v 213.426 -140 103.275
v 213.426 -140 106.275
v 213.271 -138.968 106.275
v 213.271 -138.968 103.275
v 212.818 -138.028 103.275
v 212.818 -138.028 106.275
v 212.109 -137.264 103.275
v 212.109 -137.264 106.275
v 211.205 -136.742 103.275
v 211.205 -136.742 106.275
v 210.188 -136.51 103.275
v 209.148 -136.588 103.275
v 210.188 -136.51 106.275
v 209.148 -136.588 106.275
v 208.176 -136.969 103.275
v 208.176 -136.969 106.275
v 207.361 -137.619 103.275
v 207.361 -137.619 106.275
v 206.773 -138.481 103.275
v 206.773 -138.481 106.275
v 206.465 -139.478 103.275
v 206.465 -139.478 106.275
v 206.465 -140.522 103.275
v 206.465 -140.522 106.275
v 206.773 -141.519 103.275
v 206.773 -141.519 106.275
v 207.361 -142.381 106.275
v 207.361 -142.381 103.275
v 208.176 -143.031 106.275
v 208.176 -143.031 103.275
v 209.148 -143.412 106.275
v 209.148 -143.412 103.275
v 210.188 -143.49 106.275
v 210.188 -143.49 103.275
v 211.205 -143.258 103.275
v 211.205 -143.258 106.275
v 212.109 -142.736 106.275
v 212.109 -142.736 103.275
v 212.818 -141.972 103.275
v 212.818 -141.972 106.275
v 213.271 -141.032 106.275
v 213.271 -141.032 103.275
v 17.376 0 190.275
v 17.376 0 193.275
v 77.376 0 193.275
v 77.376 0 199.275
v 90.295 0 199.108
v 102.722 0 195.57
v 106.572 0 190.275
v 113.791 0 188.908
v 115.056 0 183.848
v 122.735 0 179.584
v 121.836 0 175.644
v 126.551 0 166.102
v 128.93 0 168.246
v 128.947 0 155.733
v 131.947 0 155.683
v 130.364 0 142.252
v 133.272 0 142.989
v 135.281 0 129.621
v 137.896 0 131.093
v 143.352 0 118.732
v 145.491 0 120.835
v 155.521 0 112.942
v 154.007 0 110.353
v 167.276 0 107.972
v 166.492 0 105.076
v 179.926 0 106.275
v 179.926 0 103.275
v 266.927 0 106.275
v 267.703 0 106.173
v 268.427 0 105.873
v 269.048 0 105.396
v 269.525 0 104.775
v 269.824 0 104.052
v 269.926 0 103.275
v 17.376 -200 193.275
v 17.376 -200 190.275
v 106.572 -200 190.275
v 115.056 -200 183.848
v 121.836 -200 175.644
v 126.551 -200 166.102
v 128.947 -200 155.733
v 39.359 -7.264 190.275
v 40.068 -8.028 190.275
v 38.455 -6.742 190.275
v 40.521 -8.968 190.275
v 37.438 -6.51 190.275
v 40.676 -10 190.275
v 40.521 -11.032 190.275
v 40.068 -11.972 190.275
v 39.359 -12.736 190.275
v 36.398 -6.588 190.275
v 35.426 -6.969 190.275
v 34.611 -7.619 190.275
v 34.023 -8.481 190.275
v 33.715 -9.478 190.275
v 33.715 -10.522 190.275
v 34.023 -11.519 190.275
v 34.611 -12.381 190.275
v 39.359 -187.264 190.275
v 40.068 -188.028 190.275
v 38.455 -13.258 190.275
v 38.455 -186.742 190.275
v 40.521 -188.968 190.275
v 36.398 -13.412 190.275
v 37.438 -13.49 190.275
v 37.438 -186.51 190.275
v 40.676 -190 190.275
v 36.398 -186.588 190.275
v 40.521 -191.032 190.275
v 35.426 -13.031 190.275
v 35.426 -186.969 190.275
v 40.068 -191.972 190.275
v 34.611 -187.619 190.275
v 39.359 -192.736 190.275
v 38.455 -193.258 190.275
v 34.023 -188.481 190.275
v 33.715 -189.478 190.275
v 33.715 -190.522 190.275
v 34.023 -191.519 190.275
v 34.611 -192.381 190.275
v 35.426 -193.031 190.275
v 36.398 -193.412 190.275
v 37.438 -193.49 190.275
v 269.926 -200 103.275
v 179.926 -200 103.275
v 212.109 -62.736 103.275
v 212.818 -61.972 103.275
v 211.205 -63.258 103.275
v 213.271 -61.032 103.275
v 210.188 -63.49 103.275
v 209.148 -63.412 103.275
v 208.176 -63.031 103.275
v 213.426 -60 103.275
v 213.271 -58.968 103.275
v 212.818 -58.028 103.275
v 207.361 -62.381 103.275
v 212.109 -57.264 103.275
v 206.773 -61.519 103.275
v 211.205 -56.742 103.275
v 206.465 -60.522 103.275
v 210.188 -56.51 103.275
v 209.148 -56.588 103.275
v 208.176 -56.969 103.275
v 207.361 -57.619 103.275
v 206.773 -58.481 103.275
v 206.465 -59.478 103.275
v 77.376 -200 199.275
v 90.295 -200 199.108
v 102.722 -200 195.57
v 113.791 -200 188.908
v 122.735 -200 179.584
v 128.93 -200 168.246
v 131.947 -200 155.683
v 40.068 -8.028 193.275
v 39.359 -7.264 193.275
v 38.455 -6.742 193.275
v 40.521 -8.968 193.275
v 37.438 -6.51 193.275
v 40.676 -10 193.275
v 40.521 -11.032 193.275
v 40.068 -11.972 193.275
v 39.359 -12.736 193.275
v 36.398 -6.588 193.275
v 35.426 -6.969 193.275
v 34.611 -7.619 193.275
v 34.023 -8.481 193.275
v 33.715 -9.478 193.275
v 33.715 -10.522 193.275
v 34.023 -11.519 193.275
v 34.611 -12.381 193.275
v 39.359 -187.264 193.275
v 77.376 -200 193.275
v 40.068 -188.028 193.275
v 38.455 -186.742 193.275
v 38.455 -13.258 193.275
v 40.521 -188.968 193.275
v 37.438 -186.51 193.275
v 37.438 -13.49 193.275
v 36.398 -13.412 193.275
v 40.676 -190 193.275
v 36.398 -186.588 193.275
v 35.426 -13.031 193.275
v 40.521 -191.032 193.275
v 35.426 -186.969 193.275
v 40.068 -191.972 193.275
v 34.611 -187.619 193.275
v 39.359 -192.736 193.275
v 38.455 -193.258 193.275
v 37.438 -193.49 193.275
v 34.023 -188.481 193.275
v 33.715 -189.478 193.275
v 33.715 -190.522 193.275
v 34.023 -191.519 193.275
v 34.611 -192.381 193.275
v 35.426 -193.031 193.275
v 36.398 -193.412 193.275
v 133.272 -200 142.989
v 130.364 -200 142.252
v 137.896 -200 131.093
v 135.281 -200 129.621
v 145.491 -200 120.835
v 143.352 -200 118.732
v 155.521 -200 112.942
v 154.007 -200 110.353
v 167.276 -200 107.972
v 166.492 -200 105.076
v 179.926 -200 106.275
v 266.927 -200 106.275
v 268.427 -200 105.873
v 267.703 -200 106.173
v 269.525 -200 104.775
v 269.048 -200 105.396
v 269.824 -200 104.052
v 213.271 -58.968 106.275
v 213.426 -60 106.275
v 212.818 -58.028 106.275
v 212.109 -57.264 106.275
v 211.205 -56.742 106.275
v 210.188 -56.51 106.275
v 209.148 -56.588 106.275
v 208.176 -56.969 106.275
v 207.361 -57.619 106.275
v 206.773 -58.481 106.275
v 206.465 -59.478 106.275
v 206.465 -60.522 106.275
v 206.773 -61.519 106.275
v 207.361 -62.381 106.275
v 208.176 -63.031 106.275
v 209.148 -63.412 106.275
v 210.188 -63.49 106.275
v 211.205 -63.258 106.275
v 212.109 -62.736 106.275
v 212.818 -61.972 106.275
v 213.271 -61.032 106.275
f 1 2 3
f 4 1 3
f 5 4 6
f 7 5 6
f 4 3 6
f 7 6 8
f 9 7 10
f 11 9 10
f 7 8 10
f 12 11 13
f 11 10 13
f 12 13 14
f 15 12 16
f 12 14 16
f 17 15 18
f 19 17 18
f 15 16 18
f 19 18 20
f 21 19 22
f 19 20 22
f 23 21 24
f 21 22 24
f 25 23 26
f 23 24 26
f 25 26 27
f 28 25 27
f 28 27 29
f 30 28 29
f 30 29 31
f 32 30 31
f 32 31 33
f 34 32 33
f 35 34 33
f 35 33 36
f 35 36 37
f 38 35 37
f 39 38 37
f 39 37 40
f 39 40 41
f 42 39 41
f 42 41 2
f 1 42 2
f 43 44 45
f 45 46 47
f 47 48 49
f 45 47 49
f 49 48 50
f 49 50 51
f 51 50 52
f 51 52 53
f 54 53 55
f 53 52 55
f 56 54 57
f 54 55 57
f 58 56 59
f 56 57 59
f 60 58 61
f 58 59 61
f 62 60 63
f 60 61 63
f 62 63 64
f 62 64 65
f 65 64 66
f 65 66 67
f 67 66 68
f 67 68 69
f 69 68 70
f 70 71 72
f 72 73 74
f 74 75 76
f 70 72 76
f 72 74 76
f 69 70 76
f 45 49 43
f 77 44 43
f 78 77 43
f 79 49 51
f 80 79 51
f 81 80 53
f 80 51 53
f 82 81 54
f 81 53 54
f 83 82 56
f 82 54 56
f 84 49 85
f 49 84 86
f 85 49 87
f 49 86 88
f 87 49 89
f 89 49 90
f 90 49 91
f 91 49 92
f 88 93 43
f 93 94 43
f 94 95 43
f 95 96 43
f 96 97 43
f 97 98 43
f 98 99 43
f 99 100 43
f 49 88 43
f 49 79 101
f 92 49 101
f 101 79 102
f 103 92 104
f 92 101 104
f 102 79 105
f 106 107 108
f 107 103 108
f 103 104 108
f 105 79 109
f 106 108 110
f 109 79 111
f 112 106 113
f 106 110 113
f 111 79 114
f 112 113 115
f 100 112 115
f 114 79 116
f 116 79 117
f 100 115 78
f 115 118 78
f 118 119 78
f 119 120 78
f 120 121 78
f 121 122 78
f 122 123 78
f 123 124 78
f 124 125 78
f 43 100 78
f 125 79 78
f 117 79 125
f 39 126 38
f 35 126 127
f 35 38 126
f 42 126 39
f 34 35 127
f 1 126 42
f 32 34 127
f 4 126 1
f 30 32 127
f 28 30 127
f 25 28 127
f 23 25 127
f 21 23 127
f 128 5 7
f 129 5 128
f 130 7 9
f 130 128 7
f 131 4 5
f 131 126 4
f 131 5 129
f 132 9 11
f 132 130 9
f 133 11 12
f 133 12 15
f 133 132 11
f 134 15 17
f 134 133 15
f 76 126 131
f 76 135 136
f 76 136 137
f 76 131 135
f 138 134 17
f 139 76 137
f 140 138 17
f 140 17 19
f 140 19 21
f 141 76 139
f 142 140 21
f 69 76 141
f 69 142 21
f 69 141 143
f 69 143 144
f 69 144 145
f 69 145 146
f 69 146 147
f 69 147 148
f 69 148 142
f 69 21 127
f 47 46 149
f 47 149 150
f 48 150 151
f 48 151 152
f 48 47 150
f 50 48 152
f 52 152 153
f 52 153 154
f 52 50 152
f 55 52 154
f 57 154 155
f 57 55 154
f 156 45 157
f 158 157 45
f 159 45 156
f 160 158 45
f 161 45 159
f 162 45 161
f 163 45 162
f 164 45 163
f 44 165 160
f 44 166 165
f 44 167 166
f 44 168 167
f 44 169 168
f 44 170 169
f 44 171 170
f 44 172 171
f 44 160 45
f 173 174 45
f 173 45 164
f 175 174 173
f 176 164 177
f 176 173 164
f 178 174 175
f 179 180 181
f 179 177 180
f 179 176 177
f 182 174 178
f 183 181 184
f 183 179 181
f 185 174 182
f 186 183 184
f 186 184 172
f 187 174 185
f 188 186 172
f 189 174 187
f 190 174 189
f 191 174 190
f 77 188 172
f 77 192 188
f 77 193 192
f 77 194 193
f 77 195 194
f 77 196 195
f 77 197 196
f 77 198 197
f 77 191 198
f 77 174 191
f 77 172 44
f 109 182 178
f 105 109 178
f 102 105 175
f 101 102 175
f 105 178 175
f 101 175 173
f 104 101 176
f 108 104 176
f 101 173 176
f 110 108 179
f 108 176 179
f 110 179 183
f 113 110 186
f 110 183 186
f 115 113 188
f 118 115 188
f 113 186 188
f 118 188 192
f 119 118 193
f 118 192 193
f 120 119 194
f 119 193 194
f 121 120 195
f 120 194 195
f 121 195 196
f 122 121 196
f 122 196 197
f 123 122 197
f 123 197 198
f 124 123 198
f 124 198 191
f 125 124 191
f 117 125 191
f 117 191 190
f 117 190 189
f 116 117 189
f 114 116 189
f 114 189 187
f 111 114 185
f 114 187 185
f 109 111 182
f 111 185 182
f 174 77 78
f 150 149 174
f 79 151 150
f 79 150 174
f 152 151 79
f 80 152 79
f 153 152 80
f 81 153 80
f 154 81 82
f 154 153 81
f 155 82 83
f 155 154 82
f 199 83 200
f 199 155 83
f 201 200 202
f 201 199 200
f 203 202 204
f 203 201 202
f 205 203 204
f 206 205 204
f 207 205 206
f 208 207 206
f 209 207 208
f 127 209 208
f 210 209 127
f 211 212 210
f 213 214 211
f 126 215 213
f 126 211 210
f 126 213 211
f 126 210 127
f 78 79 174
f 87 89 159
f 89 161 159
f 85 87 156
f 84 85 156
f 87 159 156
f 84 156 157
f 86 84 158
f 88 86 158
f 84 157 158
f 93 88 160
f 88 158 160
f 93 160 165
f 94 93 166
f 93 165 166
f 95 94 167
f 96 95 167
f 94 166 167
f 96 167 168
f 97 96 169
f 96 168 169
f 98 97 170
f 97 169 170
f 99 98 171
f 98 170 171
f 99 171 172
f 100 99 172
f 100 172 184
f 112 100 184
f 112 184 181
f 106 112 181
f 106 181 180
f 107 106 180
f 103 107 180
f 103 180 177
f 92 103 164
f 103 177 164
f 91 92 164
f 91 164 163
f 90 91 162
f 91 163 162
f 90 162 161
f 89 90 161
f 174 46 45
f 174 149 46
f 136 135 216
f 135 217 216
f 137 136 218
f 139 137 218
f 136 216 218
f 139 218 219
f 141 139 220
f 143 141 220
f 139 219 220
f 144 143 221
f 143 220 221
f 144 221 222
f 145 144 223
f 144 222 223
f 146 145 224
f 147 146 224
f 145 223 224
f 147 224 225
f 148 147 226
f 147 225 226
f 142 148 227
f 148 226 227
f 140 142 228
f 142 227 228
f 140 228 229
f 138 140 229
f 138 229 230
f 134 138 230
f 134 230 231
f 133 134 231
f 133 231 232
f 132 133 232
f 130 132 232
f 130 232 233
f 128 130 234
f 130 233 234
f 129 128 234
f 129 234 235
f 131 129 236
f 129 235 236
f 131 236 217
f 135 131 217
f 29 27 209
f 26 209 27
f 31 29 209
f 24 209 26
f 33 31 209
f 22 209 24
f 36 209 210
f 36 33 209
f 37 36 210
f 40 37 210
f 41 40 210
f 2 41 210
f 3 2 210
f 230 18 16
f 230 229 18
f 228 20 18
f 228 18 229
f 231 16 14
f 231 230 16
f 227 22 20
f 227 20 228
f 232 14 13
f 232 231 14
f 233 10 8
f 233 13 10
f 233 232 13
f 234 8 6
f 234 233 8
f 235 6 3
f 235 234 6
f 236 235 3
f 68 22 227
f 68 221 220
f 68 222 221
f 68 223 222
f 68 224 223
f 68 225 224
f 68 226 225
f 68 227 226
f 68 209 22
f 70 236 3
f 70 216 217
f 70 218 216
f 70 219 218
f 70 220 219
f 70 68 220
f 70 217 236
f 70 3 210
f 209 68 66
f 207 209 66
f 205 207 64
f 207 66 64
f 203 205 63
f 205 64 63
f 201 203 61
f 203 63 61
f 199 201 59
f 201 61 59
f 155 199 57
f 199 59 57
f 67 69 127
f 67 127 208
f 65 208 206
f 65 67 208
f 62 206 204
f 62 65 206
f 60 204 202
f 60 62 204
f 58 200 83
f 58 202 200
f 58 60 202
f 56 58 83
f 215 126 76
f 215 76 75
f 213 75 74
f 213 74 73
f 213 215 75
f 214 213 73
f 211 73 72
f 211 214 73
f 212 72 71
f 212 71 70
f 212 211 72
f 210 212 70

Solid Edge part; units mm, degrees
sketch "Sketch1" plane through (0, 0, 0) normal (0, -1, 0) x (1, 0, 0)
  line L0 (77.3764, 199.2749) -> (17.3764, 199.2749)
  line L1 (17.3764, 199.2749) -> (17.3764, 196.2749)
  line L2 (17.3764, 196.2749) -> (77.3764, 196.2749)
  arc A0 (77.3764, 196.2749) -> (128.9473, 155.7325) centre (83.2091, 150.6232) cw
  arc A1 (128.9473, 155.7325) -> (179.9264, 103.2749) centre (179.9264, 154.2749) ccw
  line L3 (269.9264, 103.2749) -> (179.9264, 103.2749)
  line L4 (269.9264, 106.2749) -> (269.9264, 103.2749)
  line L5 (179.9264, 106.2749) -> (269.9264, 106.2749)
  arc A2 (131.9471, 155.6831) -> (179.9264, 106.2749) centre (179.9264, 154.2749) ccw
  arc A3 (77.3764, 199.2749) -> (131.9471, 155.6831) centre (83.2091, 150.6232) cw
  dimension "D1" = 3
  dimension "D2" = 60
  dimension "D3" = 90
  dimension "D4" = 3
  dimension "D5" = 90
  dimension "D6" = 102.55
  dimension "D7" = 49
  dimension "D8" = 48
  dimension "D9" = 90
extrude "Protrusion1" add sketch "Sketch1" along normal blind 200
fillet "Verrundung_4" radius 3 1 edges at (269.9264, -100, 106.2749)
sketch "Sketch2" plane through (223.4264, -100, 106.2749) normal (0, 0, 1) x (1, 0, 0)
  circle A0 centre (-13.5, 40) radius 3.5
  circle A1 centre (-13.5, -40) radius 3.5
  dimension "D1" = 7
  dimension "D2" = 80
  dimension "D3" = 60
extrude "Cutout1" cut sketch "Sketch2" against normal through all
sketch "Sketch3" plane through (143.6514, -200, 152.9362) normal (0, -1, 0) x (1, 0, 0)
  line L0 (-126.275, 37.3386) -> (-126.275, 43.3386)
  line L1 (-126.275, 43.3386) -> (-126.275, 46.3386)
  line L2 (-126.275, 46.3386) -> (-66.275, 46.3386)
  line L3 (-66.275, 46.3386) -> (-50.0814, 44.2327)
  line L4 (-50.0814, 44.2327) -> (-37.0073, 38.973)
  line L5 (-37.0073, 38.973) -> (-35.5454, 37.3386)
  line L6 (-35.5454, 37.3386) -> (-126.275, 37.3386)
  dimension "D1" = 6
extrude "Protrusion2" add sketch "Sketch3" against normal up to vertex (200 mm away)
sketch "Sketch4" plane through (47.3764, -100, 199.2749) normal (0, 0, 1) x (1, 0, 0)
  circle A0 centre (-10.2, 90) radius 3.5
  circle A1 centre (-10.2, -90) radius 3.5
  dimension "D1" = 10
  dimension "D2" = 7
  dimension "D3" = 19.8
  dimension "D4" = 10
extrude "Cutout2" cut sketch "Sketch4" against normal through all
sketch "Sketch5" plane through (143.6514, -200, 151.449) normal (0, -1, 0) x (1, 0, 0)
  line L0 (-126.275, 47.8258) -> (-66.275, 47.8258)
  line L1 (-66.275, 47.8258) -> (-66.275, 41.8258)
  line L2 (-66.275, 41.8258) -> (-126.275, 41.8258)
  line L3 (-126.275, 41.8258) -> (-126.275, 47.8258)
extrude "Cutout3" cut sketch "Sketch5" against normal through all
properties material "Nylon, allgemein"
